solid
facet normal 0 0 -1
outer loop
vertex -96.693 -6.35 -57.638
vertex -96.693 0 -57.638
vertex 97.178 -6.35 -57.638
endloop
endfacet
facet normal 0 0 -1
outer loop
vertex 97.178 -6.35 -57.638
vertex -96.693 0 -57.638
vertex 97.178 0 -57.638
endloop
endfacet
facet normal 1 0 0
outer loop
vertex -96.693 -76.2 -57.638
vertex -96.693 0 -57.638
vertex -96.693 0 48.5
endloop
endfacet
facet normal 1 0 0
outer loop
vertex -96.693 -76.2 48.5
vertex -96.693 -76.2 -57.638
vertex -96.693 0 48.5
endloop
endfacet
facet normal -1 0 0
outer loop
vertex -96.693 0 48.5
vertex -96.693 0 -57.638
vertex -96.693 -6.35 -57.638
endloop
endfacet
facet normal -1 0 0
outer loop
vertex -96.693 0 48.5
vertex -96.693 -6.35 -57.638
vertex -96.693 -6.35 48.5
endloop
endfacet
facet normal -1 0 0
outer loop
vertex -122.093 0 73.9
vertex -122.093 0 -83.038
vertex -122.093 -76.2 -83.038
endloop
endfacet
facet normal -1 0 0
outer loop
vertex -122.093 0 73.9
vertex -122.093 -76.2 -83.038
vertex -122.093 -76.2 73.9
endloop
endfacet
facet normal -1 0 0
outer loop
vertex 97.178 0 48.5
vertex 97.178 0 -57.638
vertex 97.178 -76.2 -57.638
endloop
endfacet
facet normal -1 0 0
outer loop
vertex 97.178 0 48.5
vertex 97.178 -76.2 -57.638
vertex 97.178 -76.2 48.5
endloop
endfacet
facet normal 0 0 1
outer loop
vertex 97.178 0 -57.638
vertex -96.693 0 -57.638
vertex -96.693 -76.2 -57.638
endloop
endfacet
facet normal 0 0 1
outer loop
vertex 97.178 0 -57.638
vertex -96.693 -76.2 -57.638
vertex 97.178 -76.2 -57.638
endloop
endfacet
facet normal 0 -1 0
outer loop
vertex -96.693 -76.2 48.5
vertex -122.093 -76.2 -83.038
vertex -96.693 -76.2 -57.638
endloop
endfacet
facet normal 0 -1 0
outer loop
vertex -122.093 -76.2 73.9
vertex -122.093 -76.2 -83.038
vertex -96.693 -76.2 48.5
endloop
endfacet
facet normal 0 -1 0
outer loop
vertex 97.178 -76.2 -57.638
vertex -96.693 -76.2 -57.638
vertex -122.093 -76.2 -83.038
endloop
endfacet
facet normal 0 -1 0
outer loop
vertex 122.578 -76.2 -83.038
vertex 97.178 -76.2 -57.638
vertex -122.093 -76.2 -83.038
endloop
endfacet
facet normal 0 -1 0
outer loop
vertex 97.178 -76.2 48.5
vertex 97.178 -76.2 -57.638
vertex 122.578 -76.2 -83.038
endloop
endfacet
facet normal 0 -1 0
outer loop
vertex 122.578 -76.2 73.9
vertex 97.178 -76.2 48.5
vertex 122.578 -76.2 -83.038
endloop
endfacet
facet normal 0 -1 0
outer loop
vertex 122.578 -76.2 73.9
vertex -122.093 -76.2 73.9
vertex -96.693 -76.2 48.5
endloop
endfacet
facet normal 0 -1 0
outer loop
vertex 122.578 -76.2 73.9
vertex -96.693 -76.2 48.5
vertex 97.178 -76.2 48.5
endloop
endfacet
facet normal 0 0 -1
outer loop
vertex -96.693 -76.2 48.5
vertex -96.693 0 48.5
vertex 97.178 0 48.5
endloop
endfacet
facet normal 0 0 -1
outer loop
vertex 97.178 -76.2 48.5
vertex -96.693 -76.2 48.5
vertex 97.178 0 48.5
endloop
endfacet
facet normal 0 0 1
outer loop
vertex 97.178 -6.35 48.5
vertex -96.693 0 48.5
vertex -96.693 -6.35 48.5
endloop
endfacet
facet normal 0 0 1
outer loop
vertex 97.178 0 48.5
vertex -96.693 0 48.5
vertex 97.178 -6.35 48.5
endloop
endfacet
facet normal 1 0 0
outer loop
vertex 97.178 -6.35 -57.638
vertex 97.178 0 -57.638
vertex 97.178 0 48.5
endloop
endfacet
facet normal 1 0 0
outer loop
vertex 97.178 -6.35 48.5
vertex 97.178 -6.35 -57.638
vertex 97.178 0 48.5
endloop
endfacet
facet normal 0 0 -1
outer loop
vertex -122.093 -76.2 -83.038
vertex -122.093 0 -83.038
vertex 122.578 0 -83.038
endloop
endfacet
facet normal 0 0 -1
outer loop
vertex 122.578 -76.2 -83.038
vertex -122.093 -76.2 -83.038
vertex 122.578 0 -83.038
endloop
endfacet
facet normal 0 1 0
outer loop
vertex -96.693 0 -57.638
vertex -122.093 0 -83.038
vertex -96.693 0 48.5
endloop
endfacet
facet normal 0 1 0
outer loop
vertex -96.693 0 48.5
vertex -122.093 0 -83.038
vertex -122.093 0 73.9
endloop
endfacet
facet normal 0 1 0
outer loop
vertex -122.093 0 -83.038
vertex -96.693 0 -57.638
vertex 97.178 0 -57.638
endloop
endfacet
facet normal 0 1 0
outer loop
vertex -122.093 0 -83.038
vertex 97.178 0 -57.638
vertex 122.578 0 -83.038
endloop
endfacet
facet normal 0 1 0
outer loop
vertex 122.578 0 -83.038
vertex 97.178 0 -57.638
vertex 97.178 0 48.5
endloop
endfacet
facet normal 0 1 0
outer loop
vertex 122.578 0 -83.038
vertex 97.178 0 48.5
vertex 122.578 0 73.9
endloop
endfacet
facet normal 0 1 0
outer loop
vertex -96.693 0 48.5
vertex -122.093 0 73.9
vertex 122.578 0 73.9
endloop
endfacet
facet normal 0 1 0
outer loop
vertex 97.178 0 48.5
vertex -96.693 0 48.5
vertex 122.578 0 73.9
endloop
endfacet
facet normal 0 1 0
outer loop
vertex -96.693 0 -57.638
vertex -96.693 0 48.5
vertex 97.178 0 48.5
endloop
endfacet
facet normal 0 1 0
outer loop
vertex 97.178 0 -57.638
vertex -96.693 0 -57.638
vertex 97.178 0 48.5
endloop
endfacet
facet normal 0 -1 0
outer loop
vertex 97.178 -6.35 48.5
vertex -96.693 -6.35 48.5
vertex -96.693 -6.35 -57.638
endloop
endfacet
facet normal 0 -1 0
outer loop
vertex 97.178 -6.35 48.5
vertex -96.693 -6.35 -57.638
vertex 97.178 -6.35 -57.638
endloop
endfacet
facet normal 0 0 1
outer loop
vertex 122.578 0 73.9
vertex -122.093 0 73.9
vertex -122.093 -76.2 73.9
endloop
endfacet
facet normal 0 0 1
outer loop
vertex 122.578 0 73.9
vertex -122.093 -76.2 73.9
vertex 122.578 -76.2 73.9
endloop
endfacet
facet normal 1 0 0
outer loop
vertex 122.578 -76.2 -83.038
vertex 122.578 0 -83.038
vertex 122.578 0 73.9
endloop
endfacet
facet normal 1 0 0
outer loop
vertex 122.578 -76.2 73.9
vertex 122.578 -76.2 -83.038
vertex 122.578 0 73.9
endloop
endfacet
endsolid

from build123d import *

# Parameters (mm, degrees)
F0_W     = 193.871734
F0_H     = 106.138659
F1_DEPTH = 6.35
F0_W_2   = 244.671734
F0_H_2   = 156.938659
F2_DEPTH = 76.2


with BuildPart() as f1:
    # F0 (on Front) → F1 (new body)
    with BuildSketch(Plane.XZ):
        with Locations((0.24253, -4.569166)):
            Rectangle(F0_W, F0_H)
    extrude(amount=F1_DEPTH)


with BuildPart() as f2:
    # F0 (on Front) → F2 (new body)
    with BuildSketch(Plane.XZ):
        with Locations((0.24253, -4.569165)):
            Rectangle(F0_W_2, F0_H_2)
        with Locations((0.24253, -4.569166)):
            Rectangle(F0_W, F0_H, mode=Mode.SUBTRACT)
    extrude(amount=F2_DEPTH)


solid = Compound([f1.part, f2.part])
